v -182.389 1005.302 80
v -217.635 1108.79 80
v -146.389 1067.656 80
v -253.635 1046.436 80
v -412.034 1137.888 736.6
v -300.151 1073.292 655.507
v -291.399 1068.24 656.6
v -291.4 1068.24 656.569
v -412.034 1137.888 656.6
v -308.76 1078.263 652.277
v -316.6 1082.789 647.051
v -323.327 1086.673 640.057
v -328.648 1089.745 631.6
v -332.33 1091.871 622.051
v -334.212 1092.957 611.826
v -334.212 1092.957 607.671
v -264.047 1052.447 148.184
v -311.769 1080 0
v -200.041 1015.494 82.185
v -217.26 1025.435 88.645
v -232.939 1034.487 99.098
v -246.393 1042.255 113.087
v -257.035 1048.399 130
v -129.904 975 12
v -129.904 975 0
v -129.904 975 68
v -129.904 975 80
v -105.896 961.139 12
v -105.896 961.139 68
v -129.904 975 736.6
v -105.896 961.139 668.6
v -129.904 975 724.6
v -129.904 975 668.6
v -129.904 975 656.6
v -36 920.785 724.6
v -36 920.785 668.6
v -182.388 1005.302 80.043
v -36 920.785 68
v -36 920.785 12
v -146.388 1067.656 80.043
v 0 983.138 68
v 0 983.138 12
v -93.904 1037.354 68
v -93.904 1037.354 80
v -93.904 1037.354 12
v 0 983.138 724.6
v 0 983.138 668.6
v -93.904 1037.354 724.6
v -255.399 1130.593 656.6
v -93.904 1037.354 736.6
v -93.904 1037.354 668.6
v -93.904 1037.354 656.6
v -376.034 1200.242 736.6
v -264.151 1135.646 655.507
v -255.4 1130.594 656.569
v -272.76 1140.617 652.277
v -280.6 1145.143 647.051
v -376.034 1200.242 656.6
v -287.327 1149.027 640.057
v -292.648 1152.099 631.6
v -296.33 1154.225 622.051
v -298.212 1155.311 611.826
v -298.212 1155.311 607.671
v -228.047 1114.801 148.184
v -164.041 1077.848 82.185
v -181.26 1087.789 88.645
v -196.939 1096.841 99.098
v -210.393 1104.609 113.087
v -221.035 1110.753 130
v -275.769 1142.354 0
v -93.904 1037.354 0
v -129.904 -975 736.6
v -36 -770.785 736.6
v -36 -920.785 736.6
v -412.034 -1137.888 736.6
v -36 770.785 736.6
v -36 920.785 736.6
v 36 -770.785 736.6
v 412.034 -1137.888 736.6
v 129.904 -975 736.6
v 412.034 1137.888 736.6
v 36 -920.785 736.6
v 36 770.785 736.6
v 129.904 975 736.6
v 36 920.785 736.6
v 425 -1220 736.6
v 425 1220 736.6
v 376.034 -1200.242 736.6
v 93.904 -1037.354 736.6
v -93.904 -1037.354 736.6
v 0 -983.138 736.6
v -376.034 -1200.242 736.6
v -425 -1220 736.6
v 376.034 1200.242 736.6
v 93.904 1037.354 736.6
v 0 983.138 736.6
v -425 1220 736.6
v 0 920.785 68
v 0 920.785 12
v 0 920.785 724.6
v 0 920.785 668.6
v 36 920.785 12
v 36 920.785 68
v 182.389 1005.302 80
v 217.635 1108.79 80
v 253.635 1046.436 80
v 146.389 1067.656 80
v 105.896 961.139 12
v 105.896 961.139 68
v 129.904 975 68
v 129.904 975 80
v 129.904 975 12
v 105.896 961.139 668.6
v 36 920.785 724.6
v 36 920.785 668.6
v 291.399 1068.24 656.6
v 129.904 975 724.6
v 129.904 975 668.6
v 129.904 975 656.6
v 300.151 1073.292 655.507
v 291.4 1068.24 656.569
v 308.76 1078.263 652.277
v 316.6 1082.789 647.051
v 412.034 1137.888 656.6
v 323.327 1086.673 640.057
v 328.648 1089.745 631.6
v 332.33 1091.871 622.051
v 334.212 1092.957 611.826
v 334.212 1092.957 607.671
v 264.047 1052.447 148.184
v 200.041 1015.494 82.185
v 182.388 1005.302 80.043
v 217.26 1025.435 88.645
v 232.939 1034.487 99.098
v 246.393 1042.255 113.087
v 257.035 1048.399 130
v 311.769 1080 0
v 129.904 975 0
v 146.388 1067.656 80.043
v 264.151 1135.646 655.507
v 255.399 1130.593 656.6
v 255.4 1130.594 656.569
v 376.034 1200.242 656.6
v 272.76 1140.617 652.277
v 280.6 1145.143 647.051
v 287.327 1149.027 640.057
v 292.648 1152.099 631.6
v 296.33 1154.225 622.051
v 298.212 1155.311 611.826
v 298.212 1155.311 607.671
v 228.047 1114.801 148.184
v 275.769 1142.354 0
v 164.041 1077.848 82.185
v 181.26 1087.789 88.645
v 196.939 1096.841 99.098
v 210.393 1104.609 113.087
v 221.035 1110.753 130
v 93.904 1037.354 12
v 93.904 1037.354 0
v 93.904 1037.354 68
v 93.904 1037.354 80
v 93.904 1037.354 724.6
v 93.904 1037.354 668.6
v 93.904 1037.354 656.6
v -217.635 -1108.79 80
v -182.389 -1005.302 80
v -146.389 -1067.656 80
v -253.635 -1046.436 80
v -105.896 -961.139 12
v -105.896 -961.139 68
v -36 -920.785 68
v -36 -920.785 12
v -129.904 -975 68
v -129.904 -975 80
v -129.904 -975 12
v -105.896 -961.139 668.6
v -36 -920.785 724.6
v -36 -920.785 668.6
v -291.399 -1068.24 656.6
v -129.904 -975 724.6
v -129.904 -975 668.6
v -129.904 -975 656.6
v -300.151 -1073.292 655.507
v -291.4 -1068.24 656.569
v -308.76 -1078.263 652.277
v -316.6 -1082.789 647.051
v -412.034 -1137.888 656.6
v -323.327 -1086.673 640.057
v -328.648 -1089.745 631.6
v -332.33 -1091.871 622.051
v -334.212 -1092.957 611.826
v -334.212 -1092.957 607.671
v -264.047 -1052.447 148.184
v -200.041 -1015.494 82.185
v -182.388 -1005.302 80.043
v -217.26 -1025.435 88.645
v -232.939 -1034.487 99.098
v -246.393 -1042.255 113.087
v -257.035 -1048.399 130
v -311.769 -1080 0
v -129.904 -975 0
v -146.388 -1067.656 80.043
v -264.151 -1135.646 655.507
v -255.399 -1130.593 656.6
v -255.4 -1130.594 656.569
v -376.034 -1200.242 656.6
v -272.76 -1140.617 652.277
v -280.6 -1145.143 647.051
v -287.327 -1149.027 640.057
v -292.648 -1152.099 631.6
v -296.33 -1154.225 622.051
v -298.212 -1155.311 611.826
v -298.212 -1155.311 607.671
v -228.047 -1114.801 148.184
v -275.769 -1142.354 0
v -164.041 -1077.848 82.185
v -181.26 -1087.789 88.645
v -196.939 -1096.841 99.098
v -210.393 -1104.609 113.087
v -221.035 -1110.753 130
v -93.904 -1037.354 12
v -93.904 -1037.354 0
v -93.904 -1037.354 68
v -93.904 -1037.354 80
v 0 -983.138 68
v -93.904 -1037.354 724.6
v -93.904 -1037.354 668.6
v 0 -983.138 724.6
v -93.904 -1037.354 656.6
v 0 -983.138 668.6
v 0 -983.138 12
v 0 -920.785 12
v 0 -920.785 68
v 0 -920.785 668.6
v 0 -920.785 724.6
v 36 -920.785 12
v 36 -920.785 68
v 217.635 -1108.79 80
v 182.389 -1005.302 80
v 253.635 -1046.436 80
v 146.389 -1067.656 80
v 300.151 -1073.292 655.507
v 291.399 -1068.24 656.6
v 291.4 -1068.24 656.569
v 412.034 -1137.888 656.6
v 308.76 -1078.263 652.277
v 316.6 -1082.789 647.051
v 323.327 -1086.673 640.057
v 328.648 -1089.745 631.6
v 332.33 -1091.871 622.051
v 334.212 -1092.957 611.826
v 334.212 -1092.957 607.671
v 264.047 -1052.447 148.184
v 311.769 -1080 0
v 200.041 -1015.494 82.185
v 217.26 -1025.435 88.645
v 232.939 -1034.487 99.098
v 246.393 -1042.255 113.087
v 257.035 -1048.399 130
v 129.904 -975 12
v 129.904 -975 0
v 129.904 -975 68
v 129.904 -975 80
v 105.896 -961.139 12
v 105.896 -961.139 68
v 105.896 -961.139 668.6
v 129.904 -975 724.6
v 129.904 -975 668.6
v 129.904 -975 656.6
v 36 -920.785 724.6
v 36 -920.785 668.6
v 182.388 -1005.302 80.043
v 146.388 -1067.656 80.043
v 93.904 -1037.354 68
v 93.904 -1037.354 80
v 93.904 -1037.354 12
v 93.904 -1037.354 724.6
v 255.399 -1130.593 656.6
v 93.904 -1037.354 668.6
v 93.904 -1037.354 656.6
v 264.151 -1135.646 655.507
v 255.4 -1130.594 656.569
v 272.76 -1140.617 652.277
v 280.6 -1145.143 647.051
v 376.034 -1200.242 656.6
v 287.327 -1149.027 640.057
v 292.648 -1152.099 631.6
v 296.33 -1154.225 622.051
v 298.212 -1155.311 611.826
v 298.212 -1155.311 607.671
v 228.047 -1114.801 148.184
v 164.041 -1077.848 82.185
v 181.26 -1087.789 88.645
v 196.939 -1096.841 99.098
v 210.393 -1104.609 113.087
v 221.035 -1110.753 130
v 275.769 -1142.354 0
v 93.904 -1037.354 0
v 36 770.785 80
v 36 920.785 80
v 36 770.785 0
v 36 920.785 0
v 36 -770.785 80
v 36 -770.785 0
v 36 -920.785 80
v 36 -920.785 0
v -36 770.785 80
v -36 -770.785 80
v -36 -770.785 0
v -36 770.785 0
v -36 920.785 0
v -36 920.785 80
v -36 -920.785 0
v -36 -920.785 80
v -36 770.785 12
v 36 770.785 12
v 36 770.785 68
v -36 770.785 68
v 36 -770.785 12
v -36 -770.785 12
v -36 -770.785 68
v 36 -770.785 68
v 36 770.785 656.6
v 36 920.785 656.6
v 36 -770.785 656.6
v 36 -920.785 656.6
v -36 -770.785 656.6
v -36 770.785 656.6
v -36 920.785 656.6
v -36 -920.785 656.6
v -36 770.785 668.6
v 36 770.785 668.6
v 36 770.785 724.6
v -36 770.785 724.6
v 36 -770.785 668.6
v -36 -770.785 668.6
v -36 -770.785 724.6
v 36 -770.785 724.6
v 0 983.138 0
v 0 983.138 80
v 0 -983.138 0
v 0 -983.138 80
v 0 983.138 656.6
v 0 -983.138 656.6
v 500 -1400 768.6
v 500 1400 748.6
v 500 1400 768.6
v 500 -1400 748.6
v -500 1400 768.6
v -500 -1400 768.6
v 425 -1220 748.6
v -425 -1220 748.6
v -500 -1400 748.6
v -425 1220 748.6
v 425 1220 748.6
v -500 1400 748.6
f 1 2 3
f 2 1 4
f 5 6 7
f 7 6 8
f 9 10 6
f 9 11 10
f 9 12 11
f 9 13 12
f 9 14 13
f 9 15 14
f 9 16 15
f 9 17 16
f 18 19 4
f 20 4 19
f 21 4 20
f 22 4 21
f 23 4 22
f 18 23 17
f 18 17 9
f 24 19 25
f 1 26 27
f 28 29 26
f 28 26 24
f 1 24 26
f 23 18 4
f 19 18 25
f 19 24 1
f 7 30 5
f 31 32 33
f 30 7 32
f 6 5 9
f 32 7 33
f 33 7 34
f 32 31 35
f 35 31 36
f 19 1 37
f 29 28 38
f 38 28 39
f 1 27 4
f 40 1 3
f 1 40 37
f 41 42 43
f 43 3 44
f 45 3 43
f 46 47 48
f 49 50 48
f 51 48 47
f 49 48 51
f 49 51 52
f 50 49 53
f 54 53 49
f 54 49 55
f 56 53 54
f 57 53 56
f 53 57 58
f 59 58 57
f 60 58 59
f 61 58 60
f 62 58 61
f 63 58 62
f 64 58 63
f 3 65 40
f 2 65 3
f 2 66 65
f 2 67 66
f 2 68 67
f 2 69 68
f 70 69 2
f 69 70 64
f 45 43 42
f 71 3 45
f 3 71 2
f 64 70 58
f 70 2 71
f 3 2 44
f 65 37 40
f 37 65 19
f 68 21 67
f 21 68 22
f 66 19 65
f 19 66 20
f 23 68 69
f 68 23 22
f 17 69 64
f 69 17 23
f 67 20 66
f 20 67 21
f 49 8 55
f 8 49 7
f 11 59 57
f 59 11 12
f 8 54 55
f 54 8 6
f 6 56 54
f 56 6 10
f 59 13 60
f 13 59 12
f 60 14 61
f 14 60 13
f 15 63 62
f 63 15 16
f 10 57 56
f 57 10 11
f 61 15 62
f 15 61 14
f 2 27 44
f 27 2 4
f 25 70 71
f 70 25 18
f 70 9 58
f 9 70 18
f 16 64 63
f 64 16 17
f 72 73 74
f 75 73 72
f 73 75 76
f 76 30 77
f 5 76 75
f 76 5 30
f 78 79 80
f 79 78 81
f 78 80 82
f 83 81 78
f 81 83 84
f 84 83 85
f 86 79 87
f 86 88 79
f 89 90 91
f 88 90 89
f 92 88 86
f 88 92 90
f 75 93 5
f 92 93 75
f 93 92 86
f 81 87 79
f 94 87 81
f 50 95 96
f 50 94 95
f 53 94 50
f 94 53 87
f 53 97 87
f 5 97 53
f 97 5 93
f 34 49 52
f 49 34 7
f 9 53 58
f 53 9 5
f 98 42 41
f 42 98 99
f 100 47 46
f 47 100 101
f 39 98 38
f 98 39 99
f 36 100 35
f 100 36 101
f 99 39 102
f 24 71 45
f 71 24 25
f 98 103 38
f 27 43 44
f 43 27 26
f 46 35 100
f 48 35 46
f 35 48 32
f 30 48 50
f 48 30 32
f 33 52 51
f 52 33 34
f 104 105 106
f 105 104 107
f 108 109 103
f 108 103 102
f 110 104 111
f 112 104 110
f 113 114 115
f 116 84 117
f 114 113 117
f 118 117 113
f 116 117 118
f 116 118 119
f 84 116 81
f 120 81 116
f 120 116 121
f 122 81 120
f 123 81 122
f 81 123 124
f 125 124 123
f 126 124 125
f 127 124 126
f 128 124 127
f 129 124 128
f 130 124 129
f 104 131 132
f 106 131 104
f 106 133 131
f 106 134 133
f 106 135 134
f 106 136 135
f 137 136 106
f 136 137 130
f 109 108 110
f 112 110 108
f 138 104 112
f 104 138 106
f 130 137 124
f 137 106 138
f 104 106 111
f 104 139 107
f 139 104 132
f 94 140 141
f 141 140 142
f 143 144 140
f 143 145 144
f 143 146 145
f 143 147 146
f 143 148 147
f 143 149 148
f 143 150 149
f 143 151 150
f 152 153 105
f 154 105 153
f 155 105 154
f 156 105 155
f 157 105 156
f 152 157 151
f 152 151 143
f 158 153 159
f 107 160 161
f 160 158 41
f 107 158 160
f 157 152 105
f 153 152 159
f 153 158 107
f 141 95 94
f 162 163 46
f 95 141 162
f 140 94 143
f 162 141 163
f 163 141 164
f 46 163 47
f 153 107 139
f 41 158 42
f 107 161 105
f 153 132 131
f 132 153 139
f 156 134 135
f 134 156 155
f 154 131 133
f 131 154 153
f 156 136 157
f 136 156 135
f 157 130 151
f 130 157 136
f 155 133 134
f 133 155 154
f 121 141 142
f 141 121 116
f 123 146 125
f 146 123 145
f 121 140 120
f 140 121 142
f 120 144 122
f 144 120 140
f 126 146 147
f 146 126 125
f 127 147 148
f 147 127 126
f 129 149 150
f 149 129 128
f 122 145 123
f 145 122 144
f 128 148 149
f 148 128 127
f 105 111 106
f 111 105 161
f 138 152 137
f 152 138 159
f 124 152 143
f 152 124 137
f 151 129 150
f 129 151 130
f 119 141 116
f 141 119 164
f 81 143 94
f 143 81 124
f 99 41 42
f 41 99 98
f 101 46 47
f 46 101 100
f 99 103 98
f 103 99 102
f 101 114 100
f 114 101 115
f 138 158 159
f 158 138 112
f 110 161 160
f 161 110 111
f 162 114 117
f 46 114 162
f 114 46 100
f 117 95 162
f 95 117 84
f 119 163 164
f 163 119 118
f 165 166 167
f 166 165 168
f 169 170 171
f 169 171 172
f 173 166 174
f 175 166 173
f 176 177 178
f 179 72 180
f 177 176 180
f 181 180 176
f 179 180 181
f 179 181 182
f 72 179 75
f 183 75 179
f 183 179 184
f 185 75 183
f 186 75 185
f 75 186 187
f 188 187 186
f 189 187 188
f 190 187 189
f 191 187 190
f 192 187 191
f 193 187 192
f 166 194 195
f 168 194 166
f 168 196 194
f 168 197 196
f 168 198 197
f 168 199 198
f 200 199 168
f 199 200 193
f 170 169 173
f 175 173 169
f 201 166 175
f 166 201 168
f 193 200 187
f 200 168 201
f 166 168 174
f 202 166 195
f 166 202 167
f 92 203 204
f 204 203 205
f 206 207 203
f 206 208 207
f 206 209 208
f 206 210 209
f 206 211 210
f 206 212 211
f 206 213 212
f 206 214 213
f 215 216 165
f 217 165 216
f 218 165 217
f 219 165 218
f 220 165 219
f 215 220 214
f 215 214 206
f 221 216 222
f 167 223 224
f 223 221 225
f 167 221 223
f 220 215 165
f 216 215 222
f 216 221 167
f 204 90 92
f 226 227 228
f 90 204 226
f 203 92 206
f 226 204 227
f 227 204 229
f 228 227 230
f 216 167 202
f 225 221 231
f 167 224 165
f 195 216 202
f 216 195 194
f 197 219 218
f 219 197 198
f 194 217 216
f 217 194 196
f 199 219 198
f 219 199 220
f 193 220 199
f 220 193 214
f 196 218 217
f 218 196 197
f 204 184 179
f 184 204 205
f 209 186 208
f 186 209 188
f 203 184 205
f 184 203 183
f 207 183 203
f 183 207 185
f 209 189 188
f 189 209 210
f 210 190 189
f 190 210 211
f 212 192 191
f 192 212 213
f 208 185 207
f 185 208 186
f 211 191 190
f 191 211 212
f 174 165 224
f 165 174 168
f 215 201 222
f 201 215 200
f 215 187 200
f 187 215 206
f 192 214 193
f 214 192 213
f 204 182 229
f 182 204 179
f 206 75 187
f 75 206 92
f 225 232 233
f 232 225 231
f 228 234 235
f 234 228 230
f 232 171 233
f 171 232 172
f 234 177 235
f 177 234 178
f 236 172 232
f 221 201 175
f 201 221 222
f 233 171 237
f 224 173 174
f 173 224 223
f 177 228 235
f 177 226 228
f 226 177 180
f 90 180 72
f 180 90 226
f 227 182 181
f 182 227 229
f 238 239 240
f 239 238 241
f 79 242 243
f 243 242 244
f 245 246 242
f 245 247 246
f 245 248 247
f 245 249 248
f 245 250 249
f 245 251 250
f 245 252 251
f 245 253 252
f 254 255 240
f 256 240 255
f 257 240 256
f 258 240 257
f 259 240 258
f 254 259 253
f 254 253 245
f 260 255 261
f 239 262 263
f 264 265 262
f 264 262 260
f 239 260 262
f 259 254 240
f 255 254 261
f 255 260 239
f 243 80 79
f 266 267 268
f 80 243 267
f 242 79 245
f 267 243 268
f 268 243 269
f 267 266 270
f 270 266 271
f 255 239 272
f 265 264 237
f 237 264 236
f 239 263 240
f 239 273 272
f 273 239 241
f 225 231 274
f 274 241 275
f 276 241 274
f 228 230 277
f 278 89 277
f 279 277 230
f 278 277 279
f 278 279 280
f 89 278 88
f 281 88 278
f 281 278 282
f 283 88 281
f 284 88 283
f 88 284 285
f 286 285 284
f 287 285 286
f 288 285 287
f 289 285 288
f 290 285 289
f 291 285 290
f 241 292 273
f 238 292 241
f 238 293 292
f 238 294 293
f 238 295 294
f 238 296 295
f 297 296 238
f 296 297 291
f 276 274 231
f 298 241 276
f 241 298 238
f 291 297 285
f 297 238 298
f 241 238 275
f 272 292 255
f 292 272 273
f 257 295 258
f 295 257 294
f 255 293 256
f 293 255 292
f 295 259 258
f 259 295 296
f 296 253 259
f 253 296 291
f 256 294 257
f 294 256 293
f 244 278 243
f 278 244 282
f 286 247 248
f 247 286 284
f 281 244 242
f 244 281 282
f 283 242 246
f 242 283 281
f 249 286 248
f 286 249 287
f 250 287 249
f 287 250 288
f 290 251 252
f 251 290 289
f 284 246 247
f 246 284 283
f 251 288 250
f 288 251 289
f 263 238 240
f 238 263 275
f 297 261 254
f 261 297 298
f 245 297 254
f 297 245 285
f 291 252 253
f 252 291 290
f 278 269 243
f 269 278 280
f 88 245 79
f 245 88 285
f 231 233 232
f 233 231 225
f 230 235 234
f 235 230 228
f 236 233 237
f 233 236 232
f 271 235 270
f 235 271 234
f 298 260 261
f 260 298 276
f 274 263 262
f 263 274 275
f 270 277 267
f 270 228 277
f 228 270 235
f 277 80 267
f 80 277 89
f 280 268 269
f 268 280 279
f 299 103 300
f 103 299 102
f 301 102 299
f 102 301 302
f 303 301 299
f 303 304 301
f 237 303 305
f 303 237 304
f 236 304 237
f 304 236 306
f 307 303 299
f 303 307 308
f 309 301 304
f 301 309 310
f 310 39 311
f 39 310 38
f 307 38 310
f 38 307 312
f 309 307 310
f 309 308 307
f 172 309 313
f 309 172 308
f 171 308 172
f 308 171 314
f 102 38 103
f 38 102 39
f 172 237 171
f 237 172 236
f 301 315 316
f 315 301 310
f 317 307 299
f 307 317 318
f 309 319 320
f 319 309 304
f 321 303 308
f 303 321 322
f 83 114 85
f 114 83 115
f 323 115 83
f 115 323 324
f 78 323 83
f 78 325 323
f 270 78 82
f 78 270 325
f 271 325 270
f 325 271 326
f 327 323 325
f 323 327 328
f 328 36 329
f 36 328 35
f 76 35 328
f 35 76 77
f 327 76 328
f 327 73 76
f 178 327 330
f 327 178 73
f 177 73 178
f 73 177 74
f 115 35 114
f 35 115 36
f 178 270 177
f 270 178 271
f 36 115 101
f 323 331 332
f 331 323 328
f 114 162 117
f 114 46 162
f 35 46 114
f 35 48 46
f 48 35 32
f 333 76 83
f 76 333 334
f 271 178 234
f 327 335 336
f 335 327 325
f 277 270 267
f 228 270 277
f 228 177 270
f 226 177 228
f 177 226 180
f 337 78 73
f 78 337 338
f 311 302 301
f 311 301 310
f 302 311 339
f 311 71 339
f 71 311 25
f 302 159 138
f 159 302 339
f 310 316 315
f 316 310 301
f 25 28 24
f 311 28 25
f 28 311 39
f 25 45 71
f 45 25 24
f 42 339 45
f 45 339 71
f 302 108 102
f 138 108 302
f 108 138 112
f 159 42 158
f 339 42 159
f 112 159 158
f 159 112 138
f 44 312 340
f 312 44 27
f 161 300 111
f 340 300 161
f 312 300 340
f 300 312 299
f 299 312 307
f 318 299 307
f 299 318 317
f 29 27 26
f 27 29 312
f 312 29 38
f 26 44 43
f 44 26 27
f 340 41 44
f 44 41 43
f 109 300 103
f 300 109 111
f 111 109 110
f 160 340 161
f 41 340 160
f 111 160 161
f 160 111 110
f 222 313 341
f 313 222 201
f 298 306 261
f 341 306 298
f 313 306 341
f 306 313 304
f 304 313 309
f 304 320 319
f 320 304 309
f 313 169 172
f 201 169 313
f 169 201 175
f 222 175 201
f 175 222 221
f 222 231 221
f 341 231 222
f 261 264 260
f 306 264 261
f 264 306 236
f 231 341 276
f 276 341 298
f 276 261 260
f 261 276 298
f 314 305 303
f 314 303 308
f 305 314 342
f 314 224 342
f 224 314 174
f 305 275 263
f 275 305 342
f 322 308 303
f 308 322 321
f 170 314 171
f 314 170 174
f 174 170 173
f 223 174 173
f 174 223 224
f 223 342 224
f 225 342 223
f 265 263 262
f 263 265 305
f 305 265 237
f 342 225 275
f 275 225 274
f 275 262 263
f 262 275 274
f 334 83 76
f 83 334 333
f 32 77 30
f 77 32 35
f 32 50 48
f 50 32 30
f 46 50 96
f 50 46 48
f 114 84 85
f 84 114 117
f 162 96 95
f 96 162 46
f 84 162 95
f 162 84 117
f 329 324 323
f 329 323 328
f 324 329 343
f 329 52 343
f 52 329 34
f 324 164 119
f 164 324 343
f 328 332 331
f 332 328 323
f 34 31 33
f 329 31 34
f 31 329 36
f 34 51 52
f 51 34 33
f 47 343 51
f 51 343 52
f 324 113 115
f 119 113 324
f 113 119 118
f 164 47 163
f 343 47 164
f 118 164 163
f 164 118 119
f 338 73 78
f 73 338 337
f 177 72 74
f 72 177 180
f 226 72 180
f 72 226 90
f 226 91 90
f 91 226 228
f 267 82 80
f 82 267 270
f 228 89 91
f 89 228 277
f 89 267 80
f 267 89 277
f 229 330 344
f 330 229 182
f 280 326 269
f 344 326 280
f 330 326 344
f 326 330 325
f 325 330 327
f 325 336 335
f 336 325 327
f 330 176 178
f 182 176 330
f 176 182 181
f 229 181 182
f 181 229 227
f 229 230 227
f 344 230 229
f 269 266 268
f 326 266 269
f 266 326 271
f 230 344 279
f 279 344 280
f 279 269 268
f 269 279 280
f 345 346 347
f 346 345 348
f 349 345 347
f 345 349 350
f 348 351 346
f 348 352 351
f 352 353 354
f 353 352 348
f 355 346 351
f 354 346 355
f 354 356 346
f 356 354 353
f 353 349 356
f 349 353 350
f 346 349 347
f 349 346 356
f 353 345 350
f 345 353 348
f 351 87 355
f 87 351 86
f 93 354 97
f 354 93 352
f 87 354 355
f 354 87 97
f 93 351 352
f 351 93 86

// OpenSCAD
// file: chairs.scad
//chairs

module whiteChair(){
	translate([0,0,350])color([1,1,1])cube([540,430,700],center=true);
}



module clearChair(){
	translate([0,0,350])%cube([450,380,700],center=true);
}
// file: ybrace.scad
// ybrace
include <dims.scad>;

ybrace();

module ybrace(){
	translate([ dim_critical * -0.5, dim_yBrace * -1 - dim_baseExtension, 0])cube([dim_critical, dim_yBrace, dim_ply]);
	rotate([ 0, 0, ang_horizontal * 0.5])translate([ dim_critical * -0.5, -dim_baseExtension, 0])cube([dim_critical, dim_yBrace, dim_ply]);
	rotate([ 0, 0, ang_horizontal * -0.5])translate([ dim_critical * -0.5, -dim_baseExtension, 0])cube([dim_critical, dim_yBrace, dim_ply]);
	
	echo("dim_critical",dim_critical);
	echo("dim_baseExtension",dim_baseExtension);
	echo("dim_baseExtension + dim_critical",dim_baseExtension + dim_critical);


}

module plate(){
	scale([ 2, 1, 2])cube([dim_critical, dim_yBrace, dim_ply]);
}
// file: bar.scad
//bar
include <dims.scad>;
use <ybrace.scad>;

bar();

module bar(){
	difference(){	
		echo("Bar len = ", dim_legGap + 2 * dim_baseExtension);
		translate([ 0, 0, dim_thickness * 0.5])cube([ dim_critical, dim_legGap + 2 * dim_baseExtension, dim_thickness], center=true);
		
		translate([ dim_critical * -1, dim_legGap * 0.5 + dim_baseExtension - dim_yBrace, -1 * dim_ply])plate();
		translate([ dim_critical * -1, dim_legGap * 0.5 + dim_baseExtension - dim_yBrace, dim_thickness - dim_ply])plate();
		
		translate([ dim_critical * -1, dim_legGap * -0.5 - dim_baseExtension, -1 * dim_ply])plate();
		translate([ dim_critical * -1, dim_legGap * -0.5 - dim_baseExtension, dim_thickness - dim_ply])plate();
	}
}
// file: leg.scad
// Leg
include <dims.scad>;
use <ybrace.scad>;

leg();

module leg(){
	dim_hypLength = ASA(90 - ang_vertical,dim_tableHeight - dim_thickness,90);
	dim_upperLeg = dim_lowerLeg + ASA(90, dim_hypLength, ang_vertical);
	filletYLow = ASA(90 - ang_vertical, dim_thickness, ang_vertical);
	filletYUp = ASA(ang_vertical, dim_thickness, 90 - ang_vertical);
	
	difference(){
		union(){
			// lower leg
			cube([ dim_critical, dim_lowerLeg, dim_thickness]);

			// vertical
			translate([ 0, dim_lowerLeg, 0])mirror([ 0, 1, 0])rotate([ ang_vertical, 0, 0])cube([ dim_critical, dim_thickness, dim_hypLength]);
	

			// upper leg
			translate([0,0,dim_tableHeight - dim_thickness])cube([ dim_critical, dim_upperLeg, dim_thickness]);

			// lower fillet
			translate([ 0, dim_lowerLeg - dim_thickness+ filletYLow, dim_thickness])fillet(rad_lower, ang_vertical, dim_critical);
	
			// upperFillet
			translate([0, dim_upperLeg - dim_thickness ,dim_tableHeight - dim_thickness])mirror([ 0, 0, 1])fillet(rad_upper, -ang_vertical, dim_critical);
		}
		translate([0,0,-1])rotate([0,0, ang_horizontal / 4])mirror([0,1,0])cube([1000,1000,1000]);
		rotate([ 0, 0,ang_horizontal / 4])translate([ -100 + dim_baseExtension, 0, 0])cube([200,200,2000], center=true);
		
		translate([ dim_critical * -0.5, 0, -1 * dim_ply])plate();
		translate([ dim_critical * -0.5, 0, dim_thickness - dim_ply])plate();
		
		translate([ dim_critical * -0.5, 0, dim_tableHeight -1 * dim_ply])plate();
		translate([ dim_critical * -0.5, 0, dim_tableHeight -1 * dim_ply - dim_thickness])plate();
	}

}


module fillet( rad, angle, thickness ){
	yAmt = ASA((angle+90)/2, rad, 90-((angle+90)/2));
	difference(){
		mirror([ 1, 0, 0])rotate([ -angle, 0, 0])rotate([ 0, -90, 0])slice(r = yAmt, deg = angle + 90, thick = thickness);
		translate([ -1, -yAmt, rad])rotate([ 0, 90, 0])cylinder(r = rad, h = thickness + 2);
	}
}

module slice(r = 10, deg = 30, thick = 10) {
	degn = (deg % 360 > 0) ? deg % 360 : deg % 360 + 360;
	difference() {
		cylinder(r = r, h = thick);
		if (degn > 180) intersection_for(a = [0, 180 - degn]) rotate(a) translate([-r, 0, -1]) cube([r * 2,r * 2,thick + 2]);
		else union() for(a = [0, 180 - degn]) rotate(a) translate([-r, 0, -1]) cube([r * 2,r * 2,thick + 2]);
	}
}
// file: dims.scad
function i2m(x)=x*25.4;
function ASA(alpha,a,beta) = ((a/sin(alpha))*sin(beta));
//echo("ASA(90, 19.05, 60) == 16.5, but was ", ASA(90,19.05,60));

//Table Height
dim_tableHeight = i2m(29);

//Table Length
dim_tableLength = 2800;

// Table Width
dim_tableWidth = 1000;

// Table top
dim_tableTop = 20;

// Leg gap
dim_legGap = 1800;

// Ply Thickness
dim_ply = 12;

// Ply stack
qty_ply = 6;

//Critical dim
dim_critical = dim_ply * qty_ply;

//Vertical angle
ang_vertical = 10;

//Base thickness
dim_thickness = 80;

//Horizontal angle
ang_horizontal = 120;

// base extension
dim_baseExtension = ASA(ang_horizontal / 2 , dim_critical / 2, 90 - (ang_horizontal / 2 ));

// y brace
dim_yBrace = 150;

// Lower leg length
dim_lowerLeg = 360;

// Lower rad
rad_lower = 100;

// Upper rad
rad_upper = 50;
// main file
include <dims.scad>;
use <leg.scad>;
use <bar.scad>;
use <ybrace.scad>;
use <chairs.scad>;

dim_supportWidth = 850;
dim_supportLength = 2440;

translate([dim_tableWidth * -0.5, dim_tableLength * -0.5, dim_tableHeight + 12])color([0.9,0.9,0.9])cube([dim_tableWidth,dim_tableLength,dim_tableTop]);
translate([dim_supportWidth * -0.5, dim_supportLength * -0.5, dim_tableHeight])color([1,0,0])cube([dim_supportWidth,dim_supportLength,12]);

// legs
translate([ 0, dim_legGap * 0.5, 0]){
	rotate([ 0, 0, ang_horizontal * 0.5])leg();
	rotate([ 0, 0, ang_horizontal * -0.5])mirror([ 1, 0, 0])leg();
}

mirror([ 0, 1, 0])
translate([ 0, dim_legGap * 0.5, 0]){
	rotate([ 0, 0, ang_horizontal * 0.5])leg();
	rotate([ 0, 0, ang_horizontal * -0.5])mirror([ 1, 0, 0])leg();
}

//bars
bar();
translate([ 0, 0, dim_thickness * -1 + dim_tableHeight ])bar();


//braces
translate([ 0, dim_legGap * 0.5 + dim_baseExtension * 2, 0])ybrace();
translate([ 0, dim_legGap * 0.5 + dim_baseExtension * 2, dim_thickness - dim_ply])ybrace();
mirror([0,1,0]){
	translate([ 0, dim_legGap * 0.5 + dim_baseExtension * 2, 0])ybrace();
	translate([ 0, dim_legGap * 0.5 + dim_baseExtension * 2, dim_thickness - dim_ply])ybrace();
}

translate([ 0, dim_legGap * 0.5 + dim_baseExtension * 2, dim_tableHeight - dim_ply])ybrace();
translate([ 0, dim_legGap * 0.5 + dim_baseExtension * 2, dim_tableHeight - dim_thickness])ybrace();
mirror([0,1,0]){
	translate([ 0, dim_legGap * 0.5 + dim_baseExtension * 2, dim_tableHeight - dim_ply])ybrace();
	translate([ 0, dim_legGap * 0.5 + dim_baseExtension * 2, dim_tableHeight - dim_thickness])ybrace();
}

/*
//chairs

translate([ 450, 215 + 25, 0])whiteChair();
translate([ 450, (dim_legGap * 0.5) - 215 + 50, 0])whiteChair();
translate([ 450, -215 - 25, 0])whiteChair();
translate([ 450, (dim_legGap * -0.5) + 215 - 50, 0])whiteChair();
translate([ -450, 215 + 25, 0])whiteChair();
translate([ -450, (dim_legGap * 0.5) - 215 + 50, 0])whiteChair();
translate([ -450, -215 - 25, 0])whiteChair();
translate([ -450, (dim_legGap * -0.5) + 215 - 50, 0])whiteChair();

translate([0,dim_tableLength * 0.5,0])clearChair();
translate([0,dim_tableLength * -0.5,0])clearChair();

*/
